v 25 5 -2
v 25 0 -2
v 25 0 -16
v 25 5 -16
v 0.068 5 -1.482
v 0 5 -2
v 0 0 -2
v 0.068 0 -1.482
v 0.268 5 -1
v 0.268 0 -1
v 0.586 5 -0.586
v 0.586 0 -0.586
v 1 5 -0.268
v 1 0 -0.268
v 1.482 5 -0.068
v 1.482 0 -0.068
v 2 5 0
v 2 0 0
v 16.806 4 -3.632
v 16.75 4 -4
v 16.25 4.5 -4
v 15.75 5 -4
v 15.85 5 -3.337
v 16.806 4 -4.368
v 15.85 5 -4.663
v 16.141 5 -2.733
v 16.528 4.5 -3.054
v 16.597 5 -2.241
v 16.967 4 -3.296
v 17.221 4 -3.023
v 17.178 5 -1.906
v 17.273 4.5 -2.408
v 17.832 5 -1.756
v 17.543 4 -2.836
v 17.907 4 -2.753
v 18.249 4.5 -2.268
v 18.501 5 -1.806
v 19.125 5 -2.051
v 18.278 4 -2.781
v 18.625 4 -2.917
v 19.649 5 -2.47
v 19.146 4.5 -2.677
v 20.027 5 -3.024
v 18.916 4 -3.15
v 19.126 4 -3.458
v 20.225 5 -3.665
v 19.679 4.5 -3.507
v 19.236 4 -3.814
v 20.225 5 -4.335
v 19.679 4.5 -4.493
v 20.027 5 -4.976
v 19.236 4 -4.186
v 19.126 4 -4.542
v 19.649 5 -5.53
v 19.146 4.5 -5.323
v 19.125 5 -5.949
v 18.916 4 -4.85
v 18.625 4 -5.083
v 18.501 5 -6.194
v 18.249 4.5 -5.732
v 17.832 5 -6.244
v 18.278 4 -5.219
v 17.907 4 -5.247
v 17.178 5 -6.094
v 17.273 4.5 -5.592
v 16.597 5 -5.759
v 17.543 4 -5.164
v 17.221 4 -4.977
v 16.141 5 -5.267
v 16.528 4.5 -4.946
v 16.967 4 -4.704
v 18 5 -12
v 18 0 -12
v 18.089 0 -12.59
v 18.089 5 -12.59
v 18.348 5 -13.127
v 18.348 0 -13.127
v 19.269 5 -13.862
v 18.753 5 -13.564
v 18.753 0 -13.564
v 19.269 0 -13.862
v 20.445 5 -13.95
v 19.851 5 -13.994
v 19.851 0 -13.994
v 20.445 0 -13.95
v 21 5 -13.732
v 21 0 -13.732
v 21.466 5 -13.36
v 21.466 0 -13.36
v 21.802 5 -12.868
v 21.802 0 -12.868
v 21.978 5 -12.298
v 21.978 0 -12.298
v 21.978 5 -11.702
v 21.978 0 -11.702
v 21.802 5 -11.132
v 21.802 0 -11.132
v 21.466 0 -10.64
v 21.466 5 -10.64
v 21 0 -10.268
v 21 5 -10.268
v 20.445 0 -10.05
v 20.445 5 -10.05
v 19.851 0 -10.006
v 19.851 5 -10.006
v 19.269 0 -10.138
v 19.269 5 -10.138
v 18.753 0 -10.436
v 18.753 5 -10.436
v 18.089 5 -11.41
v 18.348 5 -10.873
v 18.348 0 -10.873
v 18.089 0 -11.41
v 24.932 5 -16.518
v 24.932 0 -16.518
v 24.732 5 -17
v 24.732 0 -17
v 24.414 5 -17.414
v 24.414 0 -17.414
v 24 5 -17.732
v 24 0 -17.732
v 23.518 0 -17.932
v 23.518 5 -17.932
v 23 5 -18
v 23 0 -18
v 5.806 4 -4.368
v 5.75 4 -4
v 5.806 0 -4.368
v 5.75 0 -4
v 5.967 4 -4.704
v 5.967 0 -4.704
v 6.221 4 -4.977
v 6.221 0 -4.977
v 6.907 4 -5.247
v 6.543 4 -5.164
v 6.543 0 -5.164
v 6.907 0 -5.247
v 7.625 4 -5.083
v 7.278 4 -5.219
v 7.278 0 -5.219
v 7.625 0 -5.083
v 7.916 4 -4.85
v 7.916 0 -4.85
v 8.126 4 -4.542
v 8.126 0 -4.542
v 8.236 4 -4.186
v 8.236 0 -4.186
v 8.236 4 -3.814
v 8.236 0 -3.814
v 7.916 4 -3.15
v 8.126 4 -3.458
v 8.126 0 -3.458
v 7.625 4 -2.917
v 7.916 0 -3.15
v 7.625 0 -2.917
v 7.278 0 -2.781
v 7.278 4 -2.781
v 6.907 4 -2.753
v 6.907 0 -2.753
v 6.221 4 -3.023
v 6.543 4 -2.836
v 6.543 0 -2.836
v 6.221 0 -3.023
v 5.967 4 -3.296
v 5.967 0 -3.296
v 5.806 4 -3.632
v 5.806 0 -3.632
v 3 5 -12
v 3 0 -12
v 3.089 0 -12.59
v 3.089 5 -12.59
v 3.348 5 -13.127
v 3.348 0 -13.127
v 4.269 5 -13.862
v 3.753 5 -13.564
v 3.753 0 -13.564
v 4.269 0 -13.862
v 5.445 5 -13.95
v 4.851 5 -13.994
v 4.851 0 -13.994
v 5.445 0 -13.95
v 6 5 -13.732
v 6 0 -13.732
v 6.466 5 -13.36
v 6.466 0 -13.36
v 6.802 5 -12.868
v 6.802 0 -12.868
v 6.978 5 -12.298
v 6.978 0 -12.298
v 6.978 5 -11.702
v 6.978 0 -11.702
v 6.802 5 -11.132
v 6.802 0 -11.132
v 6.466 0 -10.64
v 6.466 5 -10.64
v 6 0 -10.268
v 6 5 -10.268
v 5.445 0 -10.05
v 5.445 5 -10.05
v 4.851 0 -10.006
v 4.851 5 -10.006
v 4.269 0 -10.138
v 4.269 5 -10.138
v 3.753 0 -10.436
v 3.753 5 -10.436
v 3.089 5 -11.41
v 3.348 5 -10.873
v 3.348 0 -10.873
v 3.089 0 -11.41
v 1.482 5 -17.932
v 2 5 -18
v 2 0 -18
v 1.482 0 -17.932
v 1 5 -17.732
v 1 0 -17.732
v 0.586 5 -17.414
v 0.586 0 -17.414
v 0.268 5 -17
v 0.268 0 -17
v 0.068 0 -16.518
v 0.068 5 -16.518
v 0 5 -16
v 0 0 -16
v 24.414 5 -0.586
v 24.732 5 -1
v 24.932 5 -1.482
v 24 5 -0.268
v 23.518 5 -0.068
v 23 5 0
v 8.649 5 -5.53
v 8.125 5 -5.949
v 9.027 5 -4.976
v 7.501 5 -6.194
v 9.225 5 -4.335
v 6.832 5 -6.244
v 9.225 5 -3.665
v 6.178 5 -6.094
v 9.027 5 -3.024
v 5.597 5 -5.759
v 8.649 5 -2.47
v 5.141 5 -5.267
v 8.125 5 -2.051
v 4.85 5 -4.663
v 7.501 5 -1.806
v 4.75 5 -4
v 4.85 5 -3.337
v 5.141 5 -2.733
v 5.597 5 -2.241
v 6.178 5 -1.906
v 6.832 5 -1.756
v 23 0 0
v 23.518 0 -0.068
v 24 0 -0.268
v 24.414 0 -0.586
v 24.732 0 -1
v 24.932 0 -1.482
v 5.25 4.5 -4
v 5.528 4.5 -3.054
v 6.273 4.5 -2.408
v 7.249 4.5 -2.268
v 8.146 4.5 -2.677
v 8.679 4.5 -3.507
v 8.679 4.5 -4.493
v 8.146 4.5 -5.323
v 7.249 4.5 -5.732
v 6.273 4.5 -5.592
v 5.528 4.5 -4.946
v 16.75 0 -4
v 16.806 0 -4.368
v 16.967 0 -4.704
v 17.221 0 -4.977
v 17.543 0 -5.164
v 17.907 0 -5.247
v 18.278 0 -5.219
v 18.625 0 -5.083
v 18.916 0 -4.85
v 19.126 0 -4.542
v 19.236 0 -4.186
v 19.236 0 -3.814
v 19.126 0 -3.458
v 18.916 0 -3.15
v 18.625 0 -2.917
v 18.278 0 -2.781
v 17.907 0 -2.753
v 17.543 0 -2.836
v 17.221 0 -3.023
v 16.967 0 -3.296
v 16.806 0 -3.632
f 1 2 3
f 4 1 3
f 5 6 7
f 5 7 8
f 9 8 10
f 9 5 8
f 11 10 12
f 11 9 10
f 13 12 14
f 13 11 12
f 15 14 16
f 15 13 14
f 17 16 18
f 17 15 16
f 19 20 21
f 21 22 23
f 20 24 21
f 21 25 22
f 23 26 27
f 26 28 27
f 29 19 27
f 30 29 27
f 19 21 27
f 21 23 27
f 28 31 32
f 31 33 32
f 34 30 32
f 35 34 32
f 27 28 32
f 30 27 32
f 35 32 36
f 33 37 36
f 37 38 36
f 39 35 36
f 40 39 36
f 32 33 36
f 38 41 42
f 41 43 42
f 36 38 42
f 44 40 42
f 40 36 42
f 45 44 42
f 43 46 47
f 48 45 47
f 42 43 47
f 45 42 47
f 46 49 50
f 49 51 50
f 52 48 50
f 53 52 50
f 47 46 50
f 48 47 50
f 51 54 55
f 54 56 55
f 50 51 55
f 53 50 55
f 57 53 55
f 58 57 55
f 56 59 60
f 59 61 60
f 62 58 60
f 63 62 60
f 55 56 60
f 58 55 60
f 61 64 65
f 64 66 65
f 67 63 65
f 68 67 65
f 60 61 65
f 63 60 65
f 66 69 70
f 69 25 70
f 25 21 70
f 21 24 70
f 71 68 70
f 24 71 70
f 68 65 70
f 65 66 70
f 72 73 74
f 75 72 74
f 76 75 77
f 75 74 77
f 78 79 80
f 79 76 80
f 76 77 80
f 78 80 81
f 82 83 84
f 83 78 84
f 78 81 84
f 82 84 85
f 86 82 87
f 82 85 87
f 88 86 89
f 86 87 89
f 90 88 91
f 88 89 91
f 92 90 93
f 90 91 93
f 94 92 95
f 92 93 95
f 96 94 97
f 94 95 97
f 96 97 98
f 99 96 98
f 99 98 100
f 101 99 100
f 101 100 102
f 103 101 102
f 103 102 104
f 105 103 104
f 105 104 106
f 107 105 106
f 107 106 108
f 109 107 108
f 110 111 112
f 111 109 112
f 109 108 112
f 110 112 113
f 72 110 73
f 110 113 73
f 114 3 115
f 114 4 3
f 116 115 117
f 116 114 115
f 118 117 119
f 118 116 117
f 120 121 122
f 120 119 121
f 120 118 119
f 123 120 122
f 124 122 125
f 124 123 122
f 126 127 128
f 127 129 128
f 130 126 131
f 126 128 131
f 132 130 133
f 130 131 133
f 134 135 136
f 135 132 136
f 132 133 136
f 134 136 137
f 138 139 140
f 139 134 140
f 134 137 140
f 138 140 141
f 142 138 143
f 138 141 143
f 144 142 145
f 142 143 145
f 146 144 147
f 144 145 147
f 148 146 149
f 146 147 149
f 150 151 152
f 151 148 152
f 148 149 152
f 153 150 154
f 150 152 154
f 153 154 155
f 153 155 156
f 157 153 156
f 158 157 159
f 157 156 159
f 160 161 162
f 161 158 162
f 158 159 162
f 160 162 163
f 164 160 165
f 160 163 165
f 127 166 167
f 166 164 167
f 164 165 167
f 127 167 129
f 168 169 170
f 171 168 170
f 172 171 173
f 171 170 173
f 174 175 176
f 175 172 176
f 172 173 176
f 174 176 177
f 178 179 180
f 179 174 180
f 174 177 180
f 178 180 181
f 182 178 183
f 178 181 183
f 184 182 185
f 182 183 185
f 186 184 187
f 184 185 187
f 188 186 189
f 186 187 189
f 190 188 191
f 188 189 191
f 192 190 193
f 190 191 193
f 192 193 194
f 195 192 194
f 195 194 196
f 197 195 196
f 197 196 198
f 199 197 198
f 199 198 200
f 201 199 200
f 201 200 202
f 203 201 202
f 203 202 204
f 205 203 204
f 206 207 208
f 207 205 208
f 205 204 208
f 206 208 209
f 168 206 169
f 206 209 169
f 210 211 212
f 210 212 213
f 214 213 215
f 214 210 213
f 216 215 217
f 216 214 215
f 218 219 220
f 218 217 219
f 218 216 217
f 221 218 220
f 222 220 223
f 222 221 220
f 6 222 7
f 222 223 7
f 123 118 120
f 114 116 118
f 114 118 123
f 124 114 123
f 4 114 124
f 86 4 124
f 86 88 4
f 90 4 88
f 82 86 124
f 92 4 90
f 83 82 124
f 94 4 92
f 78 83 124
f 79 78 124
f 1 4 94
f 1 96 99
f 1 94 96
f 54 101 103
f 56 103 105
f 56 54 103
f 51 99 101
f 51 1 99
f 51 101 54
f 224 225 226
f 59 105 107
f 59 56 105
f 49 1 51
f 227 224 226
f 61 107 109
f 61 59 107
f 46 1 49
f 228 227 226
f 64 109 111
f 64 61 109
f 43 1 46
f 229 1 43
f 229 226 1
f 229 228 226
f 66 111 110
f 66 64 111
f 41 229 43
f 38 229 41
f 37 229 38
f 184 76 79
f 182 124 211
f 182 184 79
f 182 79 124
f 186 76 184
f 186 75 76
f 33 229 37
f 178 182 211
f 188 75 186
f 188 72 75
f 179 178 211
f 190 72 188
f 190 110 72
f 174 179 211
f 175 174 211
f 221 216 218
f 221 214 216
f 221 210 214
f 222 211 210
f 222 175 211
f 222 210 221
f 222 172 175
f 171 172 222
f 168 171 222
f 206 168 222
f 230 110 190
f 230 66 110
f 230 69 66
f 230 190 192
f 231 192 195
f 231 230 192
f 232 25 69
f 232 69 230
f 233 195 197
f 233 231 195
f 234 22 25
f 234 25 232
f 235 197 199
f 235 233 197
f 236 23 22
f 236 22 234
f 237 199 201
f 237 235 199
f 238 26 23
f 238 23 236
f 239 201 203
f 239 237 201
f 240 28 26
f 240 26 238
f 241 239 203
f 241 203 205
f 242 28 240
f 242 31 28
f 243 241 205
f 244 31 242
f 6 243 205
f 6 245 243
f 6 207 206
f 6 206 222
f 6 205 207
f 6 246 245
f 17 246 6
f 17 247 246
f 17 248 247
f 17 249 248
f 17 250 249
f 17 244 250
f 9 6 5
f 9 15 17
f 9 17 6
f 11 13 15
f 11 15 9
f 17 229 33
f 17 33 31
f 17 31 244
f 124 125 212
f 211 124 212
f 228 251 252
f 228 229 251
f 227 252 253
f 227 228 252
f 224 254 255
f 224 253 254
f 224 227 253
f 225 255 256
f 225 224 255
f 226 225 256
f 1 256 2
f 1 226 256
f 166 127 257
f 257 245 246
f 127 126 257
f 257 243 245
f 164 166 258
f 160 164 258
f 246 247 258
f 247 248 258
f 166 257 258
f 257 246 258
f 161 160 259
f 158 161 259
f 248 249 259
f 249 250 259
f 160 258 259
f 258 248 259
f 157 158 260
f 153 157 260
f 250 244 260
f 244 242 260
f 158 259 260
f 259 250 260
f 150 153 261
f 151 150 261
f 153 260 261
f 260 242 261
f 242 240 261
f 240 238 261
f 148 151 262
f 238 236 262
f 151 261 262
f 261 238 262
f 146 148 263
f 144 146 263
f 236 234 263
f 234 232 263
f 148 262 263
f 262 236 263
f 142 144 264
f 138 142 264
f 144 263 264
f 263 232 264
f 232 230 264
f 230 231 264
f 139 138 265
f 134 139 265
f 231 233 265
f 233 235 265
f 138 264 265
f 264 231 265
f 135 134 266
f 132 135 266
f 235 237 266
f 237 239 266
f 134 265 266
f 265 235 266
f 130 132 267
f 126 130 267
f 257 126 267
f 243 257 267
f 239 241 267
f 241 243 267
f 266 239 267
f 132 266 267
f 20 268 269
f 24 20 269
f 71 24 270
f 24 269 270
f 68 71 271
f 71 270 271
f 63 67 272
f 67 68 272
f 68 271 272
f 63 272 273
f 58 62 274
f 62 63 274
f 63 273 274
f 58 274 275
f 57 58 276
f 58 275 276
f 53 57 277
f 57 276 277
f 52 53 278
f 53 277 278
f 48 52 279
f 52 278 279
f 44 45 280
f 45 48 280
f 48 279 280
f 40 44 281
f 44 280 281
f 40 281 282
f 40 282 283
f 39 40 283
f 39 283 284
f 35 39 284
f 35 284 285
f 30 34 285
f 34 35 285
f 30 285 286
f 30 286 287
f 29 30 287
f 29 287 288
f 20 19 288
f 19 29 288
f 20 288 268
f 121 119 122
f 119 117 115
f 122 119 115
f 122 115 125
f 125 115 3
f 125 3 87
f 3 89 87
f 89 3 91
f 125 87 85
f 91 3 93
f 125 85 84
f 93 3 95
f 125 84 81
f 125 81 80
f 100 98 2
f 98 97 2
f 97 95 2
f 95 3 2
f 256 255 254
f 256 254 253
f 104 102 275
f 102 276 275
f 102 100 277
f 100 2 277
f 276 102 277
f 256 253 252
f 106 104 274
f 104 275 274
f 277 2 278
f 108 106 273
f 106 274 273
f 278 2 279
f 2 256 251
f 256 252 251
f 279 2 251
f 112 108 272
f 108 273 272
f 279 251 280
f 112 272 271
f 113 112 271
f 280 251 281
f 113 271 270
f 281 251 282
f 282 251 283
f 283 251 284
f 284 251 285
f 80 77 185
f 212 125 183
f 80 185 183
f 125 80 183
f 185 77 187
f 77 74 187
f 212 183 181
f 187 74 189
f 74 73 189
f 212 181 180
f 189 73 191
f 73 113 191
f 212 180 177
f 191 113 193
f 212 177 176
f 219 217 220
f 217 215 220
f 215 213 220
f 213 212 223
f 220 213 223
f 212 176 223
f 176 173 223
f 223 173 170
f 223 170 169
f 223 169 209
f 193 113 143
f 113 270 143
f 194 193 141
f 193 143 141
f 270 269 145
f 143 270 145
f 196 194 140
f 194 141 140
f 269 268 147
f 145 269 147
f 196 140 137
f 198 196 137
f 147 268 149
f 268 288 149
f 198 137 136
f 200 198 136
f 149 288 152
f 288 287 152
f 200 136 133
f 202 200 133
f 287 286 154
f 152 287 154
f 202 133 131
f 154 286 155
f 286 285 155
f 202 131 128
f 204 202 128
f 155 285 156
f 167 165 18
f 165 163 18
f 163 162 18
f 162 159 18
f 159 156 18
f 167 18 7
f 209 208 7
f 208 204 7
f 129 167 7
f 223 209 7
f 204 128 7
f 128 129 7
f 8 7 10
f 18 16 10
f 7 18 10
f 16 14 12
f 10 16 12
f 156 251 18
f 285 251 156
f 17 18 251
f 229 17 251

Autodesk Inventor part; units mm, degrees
ref_plane "YZ Plane" through (0, 0, 0) normal (1, 0, 0) x (0, 1, 0)
ref_plane "XZ Plane" through (0, 0, 0) normal (0, 1, 0) x (-1, 0, 0)
ref_plane "XY Plane" through (0, 0, 0) normal (0, 0, 1) x (1, 0, 0)
sketch "Sketch1" plane through (0, 0, 0) normal (0, 1, 0) x (-1, 0, 0)
  line L0 (0, 0) -> (-25, 0)
  line L1 (-25, 0) -> (-25, -18)
  line L2 (-25, -18) -> (0, -18)
  line L3 (0, -18) -> (0, 0)
  circle A0 centre (-7, -4) radius 1.25
  circle A1 centre (-18, -4) radius 1.25
  circle A2 centre (-5, -12) radius 2
  circle A3 centre (-20, -12) radius 2
  dimension "d0" = 25
  dimension "d1" = 18
  dimension "d2" = 2.5
  dimension "d3" = 2.5
  dimension "d4" = 4
  dimension "d5" = 4
  dimension "d6" = 11
  dimension "d7" = 15
  dimension "d8" = 7
  dimension "d9" = 5
  dimension "d10" = 4
  dimension "d11" = 4
  dimension "d12" = 8
extrude "Extrusion1" add sketch "Sketch1" along normal blind 5
fillet "Fillet1" radius 2 4 edges at (0, 2.5, 0) (0, 2.5, -18) (25, 2.5, -18) (25, 2.5, 0)
chamfer "Chamfer1" distance 1 angle 45 1 edges at (8.25, 5, -4)
chamfer "Chamfer2" distance 1 angle 45 1 edges at (19.25, 5, -4)
properties part number "veg_kapcs_tart_csavarral"
